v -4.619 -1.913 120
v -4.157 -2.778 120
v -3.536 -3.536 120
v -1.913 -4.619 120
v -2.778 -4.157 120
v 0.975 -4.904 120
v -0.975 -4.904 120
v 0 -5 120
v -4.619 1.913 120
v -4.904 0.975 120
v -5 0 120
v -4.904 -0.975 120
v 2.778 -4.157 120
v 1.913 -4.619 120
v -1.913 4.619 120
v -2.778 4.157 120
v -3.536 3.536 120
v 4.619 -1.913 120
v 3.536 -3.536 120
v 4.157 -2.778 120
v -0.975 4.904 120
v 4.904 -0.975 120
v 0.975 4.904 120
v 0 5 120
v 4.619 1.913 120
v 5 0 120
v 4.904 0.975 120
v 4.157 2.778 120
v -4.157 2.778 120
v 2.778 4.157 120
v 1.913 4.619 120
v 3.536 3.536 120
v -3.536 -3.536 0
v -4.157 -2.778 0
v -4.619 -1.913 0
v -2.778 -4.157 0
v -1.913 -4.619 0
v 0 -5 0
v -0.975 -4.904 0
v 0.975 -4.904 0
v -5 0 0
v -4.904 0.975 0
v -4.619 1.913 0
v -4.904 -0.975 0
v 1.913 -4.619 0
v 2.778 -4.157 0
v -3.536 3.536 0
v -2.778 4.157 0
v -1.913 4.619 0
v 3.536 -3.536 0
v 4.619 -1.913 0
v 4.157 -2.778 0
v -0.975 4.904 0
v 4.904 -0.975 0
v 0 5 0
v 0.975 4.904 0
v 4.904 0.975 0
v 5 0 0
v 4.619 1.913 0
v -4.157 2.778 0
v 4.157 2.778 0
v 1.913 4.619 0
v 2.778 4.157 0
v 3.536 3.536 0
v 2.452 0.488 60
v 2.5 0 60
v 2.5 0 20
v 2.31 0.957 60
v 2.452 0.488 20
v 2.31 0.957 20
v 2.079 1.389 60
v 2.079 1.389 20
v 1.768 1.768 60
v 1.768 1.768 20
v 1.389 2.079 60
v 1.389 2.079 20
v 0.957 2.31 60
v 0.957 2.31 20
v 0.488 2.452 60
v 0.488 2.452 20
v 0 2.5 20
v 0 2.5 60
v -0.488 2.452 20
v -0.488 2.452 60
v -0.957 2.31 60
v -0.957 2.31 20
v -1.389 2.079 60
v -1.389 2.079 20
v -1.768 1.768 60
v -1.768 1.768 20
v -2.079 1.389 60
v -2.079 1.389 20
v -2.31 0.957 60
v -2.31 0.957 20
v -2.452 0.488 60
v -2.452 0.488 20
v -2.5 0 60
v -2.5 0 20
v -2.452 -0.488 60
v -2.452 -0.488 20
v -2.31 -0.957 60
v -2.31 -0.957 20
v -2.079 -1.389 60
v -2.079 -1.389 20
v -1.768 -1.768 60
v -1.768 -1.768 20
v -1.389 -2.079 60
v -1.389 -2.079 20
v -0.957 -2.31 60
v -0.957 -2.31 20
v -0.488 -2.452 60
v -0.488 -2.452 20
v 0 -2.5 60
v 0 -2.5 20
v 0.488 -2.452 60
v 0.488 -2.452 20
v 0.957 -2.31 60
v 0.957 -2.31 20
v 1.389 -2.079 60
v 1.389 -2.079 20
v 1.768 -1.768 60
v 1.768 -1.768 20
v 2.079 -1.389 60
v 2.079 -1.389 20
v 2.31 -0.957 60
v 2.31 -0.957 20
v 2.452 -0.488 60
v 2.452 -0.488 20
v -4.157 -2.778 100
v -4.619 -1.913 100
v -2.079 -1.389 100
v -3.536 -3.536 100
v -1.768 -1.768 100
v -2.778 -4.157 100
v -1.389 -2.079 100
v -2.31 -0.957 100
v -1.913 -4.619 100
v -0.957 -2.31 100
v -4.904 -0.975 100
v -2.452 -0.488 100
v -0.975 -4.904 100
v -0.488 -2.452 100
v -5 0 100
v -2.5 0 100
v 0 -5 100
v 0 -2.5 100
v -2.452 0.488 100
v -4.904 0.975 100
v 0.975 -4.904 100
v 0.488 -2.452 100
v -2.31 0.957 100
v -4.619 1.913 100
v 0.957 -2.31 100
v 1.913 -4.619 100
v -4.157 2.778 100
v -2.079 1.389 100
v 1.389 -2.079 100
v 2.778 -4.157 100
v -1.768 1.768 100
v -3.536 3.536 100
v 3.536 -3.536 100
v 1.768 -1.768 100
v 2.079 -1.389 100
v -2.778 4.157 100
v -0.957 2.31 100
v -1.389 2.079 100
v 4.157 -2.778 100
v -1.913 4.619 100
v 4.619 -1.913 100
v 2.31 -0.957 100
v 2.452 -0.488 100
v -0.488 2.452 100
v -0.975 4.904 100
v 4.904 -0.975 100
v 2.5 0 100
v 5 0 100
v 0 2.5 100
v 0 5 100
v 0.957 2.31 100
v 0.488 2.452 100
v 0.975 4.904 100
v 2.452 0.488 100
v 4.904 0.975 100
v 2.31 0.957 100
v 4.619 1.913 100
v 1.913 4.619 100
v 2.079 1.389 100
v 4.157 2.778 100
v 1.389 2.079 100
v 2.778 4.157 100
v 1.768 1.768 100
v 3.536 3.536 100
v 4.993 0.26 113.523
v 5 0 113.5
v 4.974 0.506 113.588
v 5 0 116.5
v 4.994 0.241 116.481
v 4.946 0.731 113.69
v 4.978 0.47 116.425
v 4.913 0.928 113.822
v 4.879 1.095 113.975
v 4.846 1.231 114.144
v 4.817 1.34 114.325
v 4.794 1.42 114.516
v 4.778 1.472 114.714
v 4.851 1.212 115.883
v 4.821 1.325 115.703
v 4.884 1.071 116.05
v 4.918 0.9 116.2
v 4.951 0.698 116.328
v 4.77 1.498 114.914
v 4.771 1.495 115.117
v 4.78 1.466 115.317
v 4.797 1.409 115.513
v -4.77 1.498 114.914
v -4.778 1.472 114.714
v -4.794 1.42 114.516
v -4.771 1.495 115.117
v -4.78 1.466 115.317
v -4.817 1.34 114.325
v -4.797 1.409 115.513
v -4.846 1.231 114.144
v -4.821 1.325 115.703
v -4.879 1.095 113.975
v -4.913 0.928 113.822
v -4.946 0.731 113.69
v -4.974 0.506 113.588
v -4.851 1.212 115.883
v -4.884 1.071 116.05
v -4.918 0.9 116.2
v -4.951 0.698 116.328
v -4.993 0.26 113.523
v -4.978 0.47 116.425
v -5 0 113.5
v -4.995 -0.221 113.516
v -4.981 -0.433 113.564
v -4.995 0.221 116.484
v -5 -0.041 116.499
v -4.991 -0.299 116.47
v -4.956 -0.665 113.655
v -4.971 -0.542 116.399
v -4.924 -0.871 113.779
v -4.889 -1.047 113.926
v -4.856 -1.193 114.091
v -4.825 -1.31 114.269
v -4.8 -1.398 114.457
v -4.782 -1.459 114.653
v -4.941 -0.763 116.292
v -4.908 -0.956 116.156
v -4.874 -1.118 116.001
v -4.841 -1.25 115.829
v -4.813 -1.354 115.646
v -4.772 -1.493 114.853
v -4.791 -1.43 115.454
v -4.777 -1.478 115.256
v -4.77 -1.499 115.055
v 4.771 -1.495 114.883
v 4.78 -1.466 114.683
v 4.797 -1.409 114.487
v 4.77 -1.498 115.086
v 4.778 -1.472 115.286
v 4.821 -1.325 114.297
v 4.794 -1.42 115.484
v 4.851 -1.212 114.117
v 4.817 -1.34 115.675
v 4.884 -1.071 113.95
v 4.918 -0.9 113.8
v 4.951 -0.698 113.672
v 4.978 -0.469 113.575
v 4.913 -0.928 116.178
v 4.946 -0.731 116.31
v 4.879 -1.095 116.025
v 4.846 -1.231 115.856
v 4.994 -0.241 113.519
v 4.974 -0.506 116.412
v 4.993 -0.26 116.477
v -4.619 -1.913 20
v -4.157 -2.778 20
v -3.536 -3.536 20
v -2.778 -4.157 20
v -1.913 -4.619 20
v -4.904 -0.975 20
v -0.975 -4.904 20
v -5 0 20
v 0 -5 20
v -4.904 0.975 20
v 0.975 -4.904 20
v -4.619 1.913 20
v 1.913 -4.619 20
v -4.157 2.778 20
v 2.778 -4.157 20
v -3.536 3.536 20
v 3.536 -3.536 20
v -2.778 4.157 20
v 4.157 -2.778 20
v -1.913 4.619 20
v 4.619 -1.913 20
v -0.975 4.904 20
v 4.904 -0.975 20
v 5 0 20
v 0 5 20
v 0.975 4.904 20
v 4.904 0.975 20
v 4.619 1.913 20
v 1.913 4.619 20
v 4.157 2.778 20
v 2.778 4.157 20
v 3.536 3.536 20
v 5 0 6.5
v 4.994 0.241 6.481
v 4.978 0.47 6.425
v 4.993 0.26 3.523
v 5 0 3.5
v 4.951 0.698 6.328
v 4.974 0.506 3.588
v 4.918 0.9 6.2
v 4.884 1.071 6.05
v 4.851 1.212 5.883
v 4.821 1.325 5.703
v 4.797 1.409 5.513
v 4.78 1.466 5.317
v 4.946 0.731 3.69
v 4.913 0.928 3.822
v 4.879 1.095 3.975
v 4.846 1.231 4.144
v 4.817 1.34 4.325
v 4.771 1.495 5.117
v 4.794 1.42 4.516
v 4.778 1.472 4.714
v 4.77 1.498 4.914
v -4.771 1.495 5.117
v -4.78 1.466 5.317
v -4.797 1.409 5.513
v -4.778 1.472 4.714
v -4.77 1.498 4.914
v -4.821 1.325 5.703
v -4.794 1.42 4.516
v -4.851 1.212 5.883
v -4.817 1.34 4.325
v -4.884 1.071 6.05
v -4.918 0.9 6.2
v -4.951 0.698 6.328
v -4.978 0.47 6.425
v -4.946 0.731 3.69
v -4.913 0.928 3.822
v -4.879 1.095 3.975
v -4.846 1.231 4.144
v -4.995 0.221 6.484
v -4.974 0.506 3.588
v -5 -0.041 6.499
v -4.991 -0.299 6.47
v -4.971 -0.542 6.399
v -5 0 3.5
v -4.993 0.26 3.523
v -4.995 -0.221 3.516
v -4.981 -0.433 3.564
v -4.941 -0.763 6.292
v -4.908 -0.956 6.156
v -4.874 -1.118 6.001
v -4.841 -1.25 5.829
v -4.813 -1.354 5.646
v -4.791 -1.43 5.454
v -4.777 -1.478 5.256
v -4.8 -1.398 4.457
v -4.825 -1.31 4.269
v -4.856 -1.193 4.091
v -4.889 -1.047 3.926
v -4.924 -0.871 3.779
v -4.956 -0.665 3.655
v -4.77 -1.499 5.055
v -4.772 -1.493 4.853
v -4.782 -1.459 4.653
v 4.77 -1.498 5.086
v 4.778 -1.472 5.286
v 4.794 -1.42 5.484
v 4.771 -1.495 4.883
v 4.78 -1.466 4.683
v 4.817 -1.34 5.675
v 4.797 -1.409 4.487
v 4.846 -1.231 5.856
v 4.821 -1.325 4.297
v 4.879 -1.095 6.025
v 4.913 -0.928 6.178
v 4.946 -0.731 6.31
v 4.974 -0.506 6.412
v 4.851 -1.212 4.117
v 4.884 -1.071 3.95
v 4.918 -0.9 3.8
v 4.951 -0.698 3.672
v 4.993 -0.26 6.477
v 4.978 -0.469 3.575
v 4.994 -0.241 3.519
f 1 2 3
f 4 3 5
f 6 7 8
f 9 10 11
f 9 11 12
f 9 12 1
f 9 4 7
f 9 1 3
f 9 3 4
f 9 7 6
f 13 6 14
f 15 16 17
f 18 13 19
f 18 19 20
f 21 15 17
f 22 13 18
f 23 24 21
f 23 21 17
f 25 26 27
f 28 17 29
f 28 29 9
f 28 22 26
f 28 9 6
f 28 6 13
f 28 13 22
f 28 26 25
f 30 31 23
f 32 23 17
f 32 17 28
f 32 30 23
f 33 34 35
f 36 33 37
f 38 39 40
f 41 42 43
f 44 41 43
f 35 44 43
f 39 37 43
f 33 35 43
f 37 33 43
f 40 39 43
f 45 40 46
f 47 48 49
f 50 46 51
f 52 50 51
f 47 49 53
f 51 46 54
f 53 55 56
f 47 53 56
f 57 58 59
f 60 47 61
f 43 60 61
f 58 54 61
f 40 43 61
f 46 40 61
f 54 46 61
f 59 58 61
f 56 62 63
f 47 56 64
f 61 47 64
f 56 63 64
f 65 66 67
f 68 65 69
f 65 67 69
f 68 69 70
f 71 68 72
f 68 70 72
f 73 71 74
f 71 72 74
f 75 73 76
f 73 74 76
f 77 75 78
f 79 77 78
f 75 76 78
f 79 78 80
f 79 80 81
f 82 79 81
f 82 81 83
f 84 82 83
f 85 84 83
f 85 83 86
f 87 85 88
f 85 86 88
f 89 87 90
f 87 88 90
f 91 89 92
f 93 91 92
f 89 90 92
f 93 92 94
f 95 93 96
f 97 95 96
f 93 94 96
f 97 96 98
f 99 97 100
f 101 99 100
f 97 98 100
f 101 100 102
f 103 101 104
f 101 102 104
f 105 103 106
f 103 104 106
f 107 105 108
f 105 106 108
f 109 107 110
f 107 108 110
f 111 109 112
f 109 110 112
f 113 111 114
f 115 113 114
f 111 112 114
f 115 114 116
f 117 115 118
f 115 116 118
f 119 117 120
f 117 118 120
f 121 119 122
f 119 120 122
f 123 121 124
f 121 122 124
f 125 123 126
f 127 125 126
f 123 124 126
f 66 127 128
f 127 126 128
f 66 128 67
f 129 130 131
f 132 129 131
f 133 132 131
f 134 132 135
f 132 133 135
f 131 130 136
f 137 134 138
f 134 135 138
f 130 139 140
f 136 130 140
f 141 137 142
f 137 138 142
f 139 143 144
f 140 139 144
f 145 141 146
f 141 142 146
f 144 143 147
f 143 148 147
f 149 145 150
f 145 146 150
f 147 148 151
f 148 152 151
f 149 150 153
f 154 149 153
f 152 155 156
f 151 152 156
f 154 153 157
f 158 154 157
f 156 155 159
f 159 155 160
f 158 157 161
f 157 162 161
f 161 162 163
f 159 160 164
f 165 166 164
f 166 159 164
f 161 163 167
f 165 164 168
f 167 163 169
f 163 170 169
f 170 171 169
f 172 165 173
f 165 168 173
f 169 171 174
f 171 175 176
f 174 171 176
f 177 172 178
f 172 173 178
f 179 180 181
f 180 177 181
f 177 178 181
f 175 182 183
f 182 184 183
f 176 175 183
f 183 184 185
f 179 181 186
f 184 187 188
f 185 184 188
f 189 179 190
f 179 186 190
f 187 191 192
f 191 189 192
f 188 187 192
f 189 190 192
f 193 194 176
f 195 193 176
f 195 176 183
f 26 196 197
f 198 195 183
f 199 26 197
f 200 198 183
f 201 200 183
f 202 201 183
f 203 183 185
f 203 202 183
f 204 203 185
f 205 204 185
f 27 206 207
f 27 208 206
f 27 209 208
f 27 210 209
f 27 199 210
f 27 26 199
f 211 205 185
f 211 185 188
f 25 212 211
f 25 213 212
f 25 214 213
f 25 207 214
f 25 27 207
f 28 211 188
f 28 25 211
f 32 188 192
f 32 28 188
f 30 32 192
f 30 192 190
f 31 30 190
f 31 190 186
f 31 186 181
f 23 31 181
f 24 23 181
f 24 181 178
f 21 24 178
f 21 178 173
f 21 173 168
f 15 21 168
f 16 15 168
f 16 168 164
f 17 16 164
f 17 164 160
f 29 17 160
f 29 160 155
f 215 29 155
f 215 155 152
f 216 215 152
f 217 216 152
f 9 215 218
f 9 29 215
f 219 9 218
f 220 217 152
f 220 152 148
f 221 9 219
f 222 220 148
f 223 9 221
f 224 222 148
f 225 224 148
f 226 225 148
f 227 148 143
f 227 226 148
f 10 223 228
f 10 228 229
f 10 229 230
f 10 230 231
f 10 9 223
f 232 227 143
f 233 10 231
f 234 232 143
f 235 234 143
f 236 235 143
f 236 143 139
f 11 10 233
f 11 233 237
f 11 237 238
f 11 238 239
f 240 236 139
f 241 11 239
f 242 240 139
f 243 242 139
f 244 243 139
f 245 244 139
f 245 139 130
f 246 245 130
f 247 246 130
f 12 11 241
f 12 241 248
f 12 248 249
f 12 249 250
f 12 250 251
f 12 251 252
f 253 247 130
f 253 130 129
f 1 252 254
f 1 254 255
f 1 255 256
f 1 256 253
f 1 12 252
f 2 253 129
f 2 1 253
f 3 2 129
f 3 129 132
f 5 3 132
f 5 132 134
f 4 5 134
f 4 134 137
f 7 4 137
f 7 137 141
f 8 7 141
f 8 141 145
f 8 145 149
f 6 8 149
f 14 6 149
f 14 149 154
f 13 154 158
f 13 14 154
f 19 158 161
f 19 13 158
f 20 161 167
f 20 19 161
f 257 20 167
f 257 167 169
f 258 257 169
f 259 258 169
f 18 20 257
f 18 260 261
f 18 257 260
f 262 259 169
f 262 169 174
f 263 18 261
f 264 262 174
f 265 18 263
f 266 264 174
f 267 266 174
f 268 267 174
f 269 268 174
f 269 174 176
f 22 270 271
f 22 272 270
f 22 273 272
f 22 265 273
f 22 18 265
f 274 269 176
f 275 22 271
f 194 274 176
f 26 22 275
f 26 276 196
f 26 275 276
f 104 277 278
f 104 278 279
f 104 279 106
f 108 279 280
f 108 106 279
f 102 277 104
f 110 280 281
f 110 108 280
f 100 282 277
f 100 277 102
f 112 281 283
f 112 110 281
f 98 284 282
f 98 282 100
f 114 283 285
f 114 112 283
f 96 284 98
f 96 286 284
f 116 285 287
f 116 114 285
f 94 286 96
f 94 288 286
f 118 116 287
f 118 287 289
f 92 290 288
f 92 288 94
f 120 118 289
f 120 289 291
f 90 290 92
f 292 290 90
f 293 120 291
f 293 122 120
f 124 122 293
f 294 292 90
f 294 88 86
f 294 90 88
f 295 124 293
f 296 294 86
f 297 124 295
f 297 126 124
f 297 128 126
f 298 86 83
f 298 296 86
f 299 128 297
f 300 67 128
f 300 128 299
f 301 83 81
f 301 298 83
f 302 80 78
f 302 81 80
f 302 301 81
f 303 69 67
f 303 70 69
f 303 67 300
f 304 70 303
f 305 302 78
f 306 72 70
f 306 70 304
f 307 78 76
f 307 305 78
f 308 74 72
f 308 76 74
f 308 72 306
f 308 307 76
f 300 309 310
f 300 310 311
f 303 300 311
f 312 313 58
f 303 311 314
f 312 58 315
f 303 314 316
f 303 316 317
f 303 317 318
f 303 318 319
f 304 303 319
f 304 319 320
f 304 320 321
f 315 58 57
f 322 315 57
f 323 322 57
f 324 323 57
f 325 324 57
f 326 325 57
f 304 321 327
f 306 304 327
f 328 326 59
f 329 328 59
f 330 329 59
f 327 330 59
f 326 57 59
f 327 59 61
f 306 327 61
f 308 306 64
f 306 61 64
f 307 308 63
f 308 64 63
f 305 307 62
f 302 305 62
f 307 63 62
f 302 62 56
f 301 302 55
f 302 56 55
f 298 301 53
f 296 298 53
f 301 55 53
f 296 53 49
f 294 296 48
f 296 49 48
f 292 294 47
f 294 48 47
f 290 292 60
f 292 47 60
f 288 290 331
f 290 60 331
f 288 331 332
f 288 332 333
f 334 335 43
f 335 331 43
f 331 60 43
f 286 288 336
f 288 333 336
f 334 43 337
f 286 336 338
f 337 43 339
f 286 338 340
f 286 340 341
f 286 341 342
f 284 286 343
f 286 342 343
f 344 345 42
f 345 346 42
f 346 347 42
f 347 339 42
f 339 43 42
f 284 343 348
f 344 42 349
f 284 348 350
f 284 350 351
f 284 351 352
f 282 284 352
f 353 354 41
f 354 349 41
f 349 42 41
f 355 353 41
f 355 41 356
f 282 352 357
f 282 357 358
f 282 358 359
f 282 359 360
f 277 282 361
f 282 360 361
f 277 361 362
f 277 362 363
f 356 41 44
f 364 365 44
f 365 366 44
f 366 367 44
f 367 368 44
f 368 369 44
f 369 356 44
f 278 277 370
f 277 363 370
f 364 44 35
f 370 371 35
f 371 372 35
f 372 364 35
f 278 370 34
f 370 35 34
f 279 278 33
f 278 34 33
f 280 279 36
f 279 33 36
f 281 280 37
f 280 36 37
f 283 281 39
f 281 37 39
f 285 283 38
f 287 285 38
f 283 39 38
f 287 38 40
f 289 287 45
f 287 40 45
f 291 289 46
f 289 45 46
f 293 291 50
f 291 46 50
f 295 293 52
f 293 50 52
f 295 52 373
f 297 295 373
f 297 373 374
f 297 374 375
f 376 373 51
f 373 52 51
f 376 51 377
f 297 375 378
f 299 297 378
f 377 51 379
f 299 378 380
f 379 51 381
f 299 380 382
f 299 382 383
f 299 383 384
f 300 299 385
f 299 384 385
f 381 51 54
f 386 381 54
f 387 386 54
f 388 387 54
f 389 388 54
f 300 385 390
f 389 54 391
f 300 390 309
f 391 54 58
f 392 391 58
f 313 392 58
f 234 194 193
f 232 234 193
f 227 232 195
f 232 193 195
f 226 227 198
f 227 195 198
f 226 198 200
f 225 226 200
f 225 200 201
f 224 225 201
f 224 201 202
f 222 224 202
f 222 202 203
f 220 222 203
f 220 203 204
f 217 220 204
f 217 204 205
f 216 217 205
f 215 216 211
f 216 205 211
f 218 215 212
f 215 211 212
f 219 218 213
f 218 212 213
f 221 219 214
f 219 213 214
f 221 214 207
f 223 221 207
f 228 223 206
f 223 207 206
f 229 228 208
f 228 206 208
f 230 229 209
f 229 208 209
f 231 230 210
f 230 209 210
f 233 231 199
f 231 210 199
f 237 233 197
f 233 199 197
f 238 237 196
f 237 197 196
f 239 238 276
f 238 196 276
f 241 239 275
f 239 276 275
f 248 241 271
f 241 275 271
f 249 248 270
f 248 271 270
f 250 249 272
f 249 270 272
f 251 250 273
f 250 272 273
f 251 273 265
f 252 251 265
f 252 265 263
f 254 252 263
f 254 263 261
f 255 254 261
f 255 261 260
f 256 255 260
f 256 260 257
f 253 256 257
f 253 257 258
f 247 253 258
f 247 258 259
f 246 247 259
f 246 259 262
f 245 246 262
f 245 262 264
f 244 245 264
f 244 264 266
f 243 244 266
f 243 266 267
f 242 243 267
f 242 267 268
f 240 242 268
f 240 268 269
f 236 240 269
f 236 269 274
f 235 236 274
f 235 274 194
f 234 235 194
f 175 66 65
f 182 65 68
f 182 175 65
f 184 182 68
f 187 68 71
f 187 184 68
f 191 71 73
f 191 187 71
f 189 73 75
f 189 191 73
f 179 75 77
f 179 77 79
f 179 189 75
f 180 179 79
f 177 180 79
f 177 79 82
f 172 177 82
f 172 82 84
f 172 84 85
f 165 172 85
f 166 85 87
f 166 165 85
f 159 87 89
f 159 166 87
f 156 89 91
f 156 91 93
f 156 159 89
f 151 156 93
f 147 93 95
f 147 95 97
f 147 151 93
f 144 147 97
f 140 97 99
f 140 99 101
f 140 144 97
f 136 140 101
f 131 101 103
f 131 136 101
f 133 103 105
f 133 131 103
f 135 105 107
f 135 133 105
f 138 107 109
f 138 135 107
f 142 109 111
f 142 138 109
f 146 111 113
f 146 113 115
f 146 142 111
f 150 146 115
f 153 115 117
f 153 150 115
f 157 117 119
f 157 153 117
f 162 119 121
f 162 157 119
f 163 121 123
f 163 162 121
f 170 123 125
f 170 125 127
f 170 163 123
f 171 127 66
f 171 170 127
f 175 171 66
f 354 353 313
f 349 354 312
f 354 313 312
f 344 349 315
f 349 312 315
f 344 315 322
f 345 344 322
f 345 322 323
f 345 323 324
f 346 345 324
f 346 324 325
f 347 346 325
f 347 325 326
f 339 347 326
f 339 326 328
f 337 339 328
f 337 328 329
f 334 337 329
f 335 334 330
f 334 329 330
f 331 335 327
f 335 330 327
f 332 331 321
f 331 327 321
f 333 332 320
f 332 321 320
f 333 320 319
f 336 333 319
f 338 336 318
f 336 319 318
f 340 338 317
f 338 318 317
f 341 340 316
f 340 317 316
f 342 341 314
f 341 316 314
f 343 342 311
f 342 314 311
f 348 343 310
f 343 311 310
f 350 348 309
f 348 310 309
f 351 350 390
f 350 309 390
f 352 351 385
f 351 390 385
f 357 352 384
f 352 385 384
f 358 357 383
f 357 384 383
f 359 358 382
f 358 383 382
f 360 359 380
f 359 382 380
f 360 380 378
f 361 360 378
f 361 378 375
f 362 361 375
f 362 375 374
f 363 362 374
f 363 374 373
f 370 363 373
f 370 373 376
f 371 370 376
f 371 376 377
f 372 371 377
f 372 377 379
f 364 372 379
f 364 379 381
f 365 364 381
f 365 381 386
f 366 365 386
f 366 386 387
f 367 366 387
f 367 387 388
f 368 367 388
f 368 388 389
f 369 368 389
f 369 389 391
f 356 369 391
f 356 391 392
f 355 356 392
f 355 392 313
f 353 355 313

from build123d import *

# Parameters (mm, degrees)
SKETCH1_R           = 5
BOSS_EXTRUDE1_DEPTH = 20
SKETCH3_R           = 2.5
BOSS_EXTRUDE2_DEPTH = 40
SKETCH7_R           = 1.5
CUT_EXTRUDE1_DEPTH  = 62.032778079
SKETCH9_R           = 1.5
CUT_EXTRUDE2_DEPTH  = 121.519707944


with BuildPart() as part:
    # Sketch1 → Boss-Extrude1 (new body)
    with BuildSketch(Plane.XY):
        Circle(SKETCH1_R)
    boss_extrude1 = extrude(amount=BOSS_EXTRUDE1_DEPTH)

    # Sketch3 → Boss-Extrude2 (add)
    with BuildSketch(Plane.XY.offset(20)):
        Circle(SKETCH3_R)
    boss_extrude2 = extrude(amount=BOSS_EXTRUDE2_DEPTH)

    # Sketch7 → Cut-Extrude1 (cut, through all)
    with BuildSketch(Plane(origin=(5, 0, 0), x_dir=(0, 0, -1), z_dir=(1, 0, 0))):
        with Locations((-5, 0)):
            Circle(SKETCH7_R)
    extrude(amount=-CUT_EXTRUDE1_DEPTH, mode=Mode.SUBTRACT)

    # Mirror4: Boss-Extrude2 across plane
    add(boss_extrude2.mirror(Plane.XY.offset(60)))

    # Mirror5: Boss-Extrude1 across plane
    add(boss_extrude1.mirror(Plane.XY.offset(60)))

    # Sketch9 → Cut-Extrude2 (cut, through all)
    with BuildSketch(Plane(origin=(5, 0, 0), x_dir=(0, 0, -1), z_dir=(1, 0, 0))):
        with Locations((-115, 0)):
            Circle(SKETCH9_R)
    extrude(amount=-CUT_EXTRUDE2_DEPTH, mode=Mode.SUBTRACT)


solid = part.part
